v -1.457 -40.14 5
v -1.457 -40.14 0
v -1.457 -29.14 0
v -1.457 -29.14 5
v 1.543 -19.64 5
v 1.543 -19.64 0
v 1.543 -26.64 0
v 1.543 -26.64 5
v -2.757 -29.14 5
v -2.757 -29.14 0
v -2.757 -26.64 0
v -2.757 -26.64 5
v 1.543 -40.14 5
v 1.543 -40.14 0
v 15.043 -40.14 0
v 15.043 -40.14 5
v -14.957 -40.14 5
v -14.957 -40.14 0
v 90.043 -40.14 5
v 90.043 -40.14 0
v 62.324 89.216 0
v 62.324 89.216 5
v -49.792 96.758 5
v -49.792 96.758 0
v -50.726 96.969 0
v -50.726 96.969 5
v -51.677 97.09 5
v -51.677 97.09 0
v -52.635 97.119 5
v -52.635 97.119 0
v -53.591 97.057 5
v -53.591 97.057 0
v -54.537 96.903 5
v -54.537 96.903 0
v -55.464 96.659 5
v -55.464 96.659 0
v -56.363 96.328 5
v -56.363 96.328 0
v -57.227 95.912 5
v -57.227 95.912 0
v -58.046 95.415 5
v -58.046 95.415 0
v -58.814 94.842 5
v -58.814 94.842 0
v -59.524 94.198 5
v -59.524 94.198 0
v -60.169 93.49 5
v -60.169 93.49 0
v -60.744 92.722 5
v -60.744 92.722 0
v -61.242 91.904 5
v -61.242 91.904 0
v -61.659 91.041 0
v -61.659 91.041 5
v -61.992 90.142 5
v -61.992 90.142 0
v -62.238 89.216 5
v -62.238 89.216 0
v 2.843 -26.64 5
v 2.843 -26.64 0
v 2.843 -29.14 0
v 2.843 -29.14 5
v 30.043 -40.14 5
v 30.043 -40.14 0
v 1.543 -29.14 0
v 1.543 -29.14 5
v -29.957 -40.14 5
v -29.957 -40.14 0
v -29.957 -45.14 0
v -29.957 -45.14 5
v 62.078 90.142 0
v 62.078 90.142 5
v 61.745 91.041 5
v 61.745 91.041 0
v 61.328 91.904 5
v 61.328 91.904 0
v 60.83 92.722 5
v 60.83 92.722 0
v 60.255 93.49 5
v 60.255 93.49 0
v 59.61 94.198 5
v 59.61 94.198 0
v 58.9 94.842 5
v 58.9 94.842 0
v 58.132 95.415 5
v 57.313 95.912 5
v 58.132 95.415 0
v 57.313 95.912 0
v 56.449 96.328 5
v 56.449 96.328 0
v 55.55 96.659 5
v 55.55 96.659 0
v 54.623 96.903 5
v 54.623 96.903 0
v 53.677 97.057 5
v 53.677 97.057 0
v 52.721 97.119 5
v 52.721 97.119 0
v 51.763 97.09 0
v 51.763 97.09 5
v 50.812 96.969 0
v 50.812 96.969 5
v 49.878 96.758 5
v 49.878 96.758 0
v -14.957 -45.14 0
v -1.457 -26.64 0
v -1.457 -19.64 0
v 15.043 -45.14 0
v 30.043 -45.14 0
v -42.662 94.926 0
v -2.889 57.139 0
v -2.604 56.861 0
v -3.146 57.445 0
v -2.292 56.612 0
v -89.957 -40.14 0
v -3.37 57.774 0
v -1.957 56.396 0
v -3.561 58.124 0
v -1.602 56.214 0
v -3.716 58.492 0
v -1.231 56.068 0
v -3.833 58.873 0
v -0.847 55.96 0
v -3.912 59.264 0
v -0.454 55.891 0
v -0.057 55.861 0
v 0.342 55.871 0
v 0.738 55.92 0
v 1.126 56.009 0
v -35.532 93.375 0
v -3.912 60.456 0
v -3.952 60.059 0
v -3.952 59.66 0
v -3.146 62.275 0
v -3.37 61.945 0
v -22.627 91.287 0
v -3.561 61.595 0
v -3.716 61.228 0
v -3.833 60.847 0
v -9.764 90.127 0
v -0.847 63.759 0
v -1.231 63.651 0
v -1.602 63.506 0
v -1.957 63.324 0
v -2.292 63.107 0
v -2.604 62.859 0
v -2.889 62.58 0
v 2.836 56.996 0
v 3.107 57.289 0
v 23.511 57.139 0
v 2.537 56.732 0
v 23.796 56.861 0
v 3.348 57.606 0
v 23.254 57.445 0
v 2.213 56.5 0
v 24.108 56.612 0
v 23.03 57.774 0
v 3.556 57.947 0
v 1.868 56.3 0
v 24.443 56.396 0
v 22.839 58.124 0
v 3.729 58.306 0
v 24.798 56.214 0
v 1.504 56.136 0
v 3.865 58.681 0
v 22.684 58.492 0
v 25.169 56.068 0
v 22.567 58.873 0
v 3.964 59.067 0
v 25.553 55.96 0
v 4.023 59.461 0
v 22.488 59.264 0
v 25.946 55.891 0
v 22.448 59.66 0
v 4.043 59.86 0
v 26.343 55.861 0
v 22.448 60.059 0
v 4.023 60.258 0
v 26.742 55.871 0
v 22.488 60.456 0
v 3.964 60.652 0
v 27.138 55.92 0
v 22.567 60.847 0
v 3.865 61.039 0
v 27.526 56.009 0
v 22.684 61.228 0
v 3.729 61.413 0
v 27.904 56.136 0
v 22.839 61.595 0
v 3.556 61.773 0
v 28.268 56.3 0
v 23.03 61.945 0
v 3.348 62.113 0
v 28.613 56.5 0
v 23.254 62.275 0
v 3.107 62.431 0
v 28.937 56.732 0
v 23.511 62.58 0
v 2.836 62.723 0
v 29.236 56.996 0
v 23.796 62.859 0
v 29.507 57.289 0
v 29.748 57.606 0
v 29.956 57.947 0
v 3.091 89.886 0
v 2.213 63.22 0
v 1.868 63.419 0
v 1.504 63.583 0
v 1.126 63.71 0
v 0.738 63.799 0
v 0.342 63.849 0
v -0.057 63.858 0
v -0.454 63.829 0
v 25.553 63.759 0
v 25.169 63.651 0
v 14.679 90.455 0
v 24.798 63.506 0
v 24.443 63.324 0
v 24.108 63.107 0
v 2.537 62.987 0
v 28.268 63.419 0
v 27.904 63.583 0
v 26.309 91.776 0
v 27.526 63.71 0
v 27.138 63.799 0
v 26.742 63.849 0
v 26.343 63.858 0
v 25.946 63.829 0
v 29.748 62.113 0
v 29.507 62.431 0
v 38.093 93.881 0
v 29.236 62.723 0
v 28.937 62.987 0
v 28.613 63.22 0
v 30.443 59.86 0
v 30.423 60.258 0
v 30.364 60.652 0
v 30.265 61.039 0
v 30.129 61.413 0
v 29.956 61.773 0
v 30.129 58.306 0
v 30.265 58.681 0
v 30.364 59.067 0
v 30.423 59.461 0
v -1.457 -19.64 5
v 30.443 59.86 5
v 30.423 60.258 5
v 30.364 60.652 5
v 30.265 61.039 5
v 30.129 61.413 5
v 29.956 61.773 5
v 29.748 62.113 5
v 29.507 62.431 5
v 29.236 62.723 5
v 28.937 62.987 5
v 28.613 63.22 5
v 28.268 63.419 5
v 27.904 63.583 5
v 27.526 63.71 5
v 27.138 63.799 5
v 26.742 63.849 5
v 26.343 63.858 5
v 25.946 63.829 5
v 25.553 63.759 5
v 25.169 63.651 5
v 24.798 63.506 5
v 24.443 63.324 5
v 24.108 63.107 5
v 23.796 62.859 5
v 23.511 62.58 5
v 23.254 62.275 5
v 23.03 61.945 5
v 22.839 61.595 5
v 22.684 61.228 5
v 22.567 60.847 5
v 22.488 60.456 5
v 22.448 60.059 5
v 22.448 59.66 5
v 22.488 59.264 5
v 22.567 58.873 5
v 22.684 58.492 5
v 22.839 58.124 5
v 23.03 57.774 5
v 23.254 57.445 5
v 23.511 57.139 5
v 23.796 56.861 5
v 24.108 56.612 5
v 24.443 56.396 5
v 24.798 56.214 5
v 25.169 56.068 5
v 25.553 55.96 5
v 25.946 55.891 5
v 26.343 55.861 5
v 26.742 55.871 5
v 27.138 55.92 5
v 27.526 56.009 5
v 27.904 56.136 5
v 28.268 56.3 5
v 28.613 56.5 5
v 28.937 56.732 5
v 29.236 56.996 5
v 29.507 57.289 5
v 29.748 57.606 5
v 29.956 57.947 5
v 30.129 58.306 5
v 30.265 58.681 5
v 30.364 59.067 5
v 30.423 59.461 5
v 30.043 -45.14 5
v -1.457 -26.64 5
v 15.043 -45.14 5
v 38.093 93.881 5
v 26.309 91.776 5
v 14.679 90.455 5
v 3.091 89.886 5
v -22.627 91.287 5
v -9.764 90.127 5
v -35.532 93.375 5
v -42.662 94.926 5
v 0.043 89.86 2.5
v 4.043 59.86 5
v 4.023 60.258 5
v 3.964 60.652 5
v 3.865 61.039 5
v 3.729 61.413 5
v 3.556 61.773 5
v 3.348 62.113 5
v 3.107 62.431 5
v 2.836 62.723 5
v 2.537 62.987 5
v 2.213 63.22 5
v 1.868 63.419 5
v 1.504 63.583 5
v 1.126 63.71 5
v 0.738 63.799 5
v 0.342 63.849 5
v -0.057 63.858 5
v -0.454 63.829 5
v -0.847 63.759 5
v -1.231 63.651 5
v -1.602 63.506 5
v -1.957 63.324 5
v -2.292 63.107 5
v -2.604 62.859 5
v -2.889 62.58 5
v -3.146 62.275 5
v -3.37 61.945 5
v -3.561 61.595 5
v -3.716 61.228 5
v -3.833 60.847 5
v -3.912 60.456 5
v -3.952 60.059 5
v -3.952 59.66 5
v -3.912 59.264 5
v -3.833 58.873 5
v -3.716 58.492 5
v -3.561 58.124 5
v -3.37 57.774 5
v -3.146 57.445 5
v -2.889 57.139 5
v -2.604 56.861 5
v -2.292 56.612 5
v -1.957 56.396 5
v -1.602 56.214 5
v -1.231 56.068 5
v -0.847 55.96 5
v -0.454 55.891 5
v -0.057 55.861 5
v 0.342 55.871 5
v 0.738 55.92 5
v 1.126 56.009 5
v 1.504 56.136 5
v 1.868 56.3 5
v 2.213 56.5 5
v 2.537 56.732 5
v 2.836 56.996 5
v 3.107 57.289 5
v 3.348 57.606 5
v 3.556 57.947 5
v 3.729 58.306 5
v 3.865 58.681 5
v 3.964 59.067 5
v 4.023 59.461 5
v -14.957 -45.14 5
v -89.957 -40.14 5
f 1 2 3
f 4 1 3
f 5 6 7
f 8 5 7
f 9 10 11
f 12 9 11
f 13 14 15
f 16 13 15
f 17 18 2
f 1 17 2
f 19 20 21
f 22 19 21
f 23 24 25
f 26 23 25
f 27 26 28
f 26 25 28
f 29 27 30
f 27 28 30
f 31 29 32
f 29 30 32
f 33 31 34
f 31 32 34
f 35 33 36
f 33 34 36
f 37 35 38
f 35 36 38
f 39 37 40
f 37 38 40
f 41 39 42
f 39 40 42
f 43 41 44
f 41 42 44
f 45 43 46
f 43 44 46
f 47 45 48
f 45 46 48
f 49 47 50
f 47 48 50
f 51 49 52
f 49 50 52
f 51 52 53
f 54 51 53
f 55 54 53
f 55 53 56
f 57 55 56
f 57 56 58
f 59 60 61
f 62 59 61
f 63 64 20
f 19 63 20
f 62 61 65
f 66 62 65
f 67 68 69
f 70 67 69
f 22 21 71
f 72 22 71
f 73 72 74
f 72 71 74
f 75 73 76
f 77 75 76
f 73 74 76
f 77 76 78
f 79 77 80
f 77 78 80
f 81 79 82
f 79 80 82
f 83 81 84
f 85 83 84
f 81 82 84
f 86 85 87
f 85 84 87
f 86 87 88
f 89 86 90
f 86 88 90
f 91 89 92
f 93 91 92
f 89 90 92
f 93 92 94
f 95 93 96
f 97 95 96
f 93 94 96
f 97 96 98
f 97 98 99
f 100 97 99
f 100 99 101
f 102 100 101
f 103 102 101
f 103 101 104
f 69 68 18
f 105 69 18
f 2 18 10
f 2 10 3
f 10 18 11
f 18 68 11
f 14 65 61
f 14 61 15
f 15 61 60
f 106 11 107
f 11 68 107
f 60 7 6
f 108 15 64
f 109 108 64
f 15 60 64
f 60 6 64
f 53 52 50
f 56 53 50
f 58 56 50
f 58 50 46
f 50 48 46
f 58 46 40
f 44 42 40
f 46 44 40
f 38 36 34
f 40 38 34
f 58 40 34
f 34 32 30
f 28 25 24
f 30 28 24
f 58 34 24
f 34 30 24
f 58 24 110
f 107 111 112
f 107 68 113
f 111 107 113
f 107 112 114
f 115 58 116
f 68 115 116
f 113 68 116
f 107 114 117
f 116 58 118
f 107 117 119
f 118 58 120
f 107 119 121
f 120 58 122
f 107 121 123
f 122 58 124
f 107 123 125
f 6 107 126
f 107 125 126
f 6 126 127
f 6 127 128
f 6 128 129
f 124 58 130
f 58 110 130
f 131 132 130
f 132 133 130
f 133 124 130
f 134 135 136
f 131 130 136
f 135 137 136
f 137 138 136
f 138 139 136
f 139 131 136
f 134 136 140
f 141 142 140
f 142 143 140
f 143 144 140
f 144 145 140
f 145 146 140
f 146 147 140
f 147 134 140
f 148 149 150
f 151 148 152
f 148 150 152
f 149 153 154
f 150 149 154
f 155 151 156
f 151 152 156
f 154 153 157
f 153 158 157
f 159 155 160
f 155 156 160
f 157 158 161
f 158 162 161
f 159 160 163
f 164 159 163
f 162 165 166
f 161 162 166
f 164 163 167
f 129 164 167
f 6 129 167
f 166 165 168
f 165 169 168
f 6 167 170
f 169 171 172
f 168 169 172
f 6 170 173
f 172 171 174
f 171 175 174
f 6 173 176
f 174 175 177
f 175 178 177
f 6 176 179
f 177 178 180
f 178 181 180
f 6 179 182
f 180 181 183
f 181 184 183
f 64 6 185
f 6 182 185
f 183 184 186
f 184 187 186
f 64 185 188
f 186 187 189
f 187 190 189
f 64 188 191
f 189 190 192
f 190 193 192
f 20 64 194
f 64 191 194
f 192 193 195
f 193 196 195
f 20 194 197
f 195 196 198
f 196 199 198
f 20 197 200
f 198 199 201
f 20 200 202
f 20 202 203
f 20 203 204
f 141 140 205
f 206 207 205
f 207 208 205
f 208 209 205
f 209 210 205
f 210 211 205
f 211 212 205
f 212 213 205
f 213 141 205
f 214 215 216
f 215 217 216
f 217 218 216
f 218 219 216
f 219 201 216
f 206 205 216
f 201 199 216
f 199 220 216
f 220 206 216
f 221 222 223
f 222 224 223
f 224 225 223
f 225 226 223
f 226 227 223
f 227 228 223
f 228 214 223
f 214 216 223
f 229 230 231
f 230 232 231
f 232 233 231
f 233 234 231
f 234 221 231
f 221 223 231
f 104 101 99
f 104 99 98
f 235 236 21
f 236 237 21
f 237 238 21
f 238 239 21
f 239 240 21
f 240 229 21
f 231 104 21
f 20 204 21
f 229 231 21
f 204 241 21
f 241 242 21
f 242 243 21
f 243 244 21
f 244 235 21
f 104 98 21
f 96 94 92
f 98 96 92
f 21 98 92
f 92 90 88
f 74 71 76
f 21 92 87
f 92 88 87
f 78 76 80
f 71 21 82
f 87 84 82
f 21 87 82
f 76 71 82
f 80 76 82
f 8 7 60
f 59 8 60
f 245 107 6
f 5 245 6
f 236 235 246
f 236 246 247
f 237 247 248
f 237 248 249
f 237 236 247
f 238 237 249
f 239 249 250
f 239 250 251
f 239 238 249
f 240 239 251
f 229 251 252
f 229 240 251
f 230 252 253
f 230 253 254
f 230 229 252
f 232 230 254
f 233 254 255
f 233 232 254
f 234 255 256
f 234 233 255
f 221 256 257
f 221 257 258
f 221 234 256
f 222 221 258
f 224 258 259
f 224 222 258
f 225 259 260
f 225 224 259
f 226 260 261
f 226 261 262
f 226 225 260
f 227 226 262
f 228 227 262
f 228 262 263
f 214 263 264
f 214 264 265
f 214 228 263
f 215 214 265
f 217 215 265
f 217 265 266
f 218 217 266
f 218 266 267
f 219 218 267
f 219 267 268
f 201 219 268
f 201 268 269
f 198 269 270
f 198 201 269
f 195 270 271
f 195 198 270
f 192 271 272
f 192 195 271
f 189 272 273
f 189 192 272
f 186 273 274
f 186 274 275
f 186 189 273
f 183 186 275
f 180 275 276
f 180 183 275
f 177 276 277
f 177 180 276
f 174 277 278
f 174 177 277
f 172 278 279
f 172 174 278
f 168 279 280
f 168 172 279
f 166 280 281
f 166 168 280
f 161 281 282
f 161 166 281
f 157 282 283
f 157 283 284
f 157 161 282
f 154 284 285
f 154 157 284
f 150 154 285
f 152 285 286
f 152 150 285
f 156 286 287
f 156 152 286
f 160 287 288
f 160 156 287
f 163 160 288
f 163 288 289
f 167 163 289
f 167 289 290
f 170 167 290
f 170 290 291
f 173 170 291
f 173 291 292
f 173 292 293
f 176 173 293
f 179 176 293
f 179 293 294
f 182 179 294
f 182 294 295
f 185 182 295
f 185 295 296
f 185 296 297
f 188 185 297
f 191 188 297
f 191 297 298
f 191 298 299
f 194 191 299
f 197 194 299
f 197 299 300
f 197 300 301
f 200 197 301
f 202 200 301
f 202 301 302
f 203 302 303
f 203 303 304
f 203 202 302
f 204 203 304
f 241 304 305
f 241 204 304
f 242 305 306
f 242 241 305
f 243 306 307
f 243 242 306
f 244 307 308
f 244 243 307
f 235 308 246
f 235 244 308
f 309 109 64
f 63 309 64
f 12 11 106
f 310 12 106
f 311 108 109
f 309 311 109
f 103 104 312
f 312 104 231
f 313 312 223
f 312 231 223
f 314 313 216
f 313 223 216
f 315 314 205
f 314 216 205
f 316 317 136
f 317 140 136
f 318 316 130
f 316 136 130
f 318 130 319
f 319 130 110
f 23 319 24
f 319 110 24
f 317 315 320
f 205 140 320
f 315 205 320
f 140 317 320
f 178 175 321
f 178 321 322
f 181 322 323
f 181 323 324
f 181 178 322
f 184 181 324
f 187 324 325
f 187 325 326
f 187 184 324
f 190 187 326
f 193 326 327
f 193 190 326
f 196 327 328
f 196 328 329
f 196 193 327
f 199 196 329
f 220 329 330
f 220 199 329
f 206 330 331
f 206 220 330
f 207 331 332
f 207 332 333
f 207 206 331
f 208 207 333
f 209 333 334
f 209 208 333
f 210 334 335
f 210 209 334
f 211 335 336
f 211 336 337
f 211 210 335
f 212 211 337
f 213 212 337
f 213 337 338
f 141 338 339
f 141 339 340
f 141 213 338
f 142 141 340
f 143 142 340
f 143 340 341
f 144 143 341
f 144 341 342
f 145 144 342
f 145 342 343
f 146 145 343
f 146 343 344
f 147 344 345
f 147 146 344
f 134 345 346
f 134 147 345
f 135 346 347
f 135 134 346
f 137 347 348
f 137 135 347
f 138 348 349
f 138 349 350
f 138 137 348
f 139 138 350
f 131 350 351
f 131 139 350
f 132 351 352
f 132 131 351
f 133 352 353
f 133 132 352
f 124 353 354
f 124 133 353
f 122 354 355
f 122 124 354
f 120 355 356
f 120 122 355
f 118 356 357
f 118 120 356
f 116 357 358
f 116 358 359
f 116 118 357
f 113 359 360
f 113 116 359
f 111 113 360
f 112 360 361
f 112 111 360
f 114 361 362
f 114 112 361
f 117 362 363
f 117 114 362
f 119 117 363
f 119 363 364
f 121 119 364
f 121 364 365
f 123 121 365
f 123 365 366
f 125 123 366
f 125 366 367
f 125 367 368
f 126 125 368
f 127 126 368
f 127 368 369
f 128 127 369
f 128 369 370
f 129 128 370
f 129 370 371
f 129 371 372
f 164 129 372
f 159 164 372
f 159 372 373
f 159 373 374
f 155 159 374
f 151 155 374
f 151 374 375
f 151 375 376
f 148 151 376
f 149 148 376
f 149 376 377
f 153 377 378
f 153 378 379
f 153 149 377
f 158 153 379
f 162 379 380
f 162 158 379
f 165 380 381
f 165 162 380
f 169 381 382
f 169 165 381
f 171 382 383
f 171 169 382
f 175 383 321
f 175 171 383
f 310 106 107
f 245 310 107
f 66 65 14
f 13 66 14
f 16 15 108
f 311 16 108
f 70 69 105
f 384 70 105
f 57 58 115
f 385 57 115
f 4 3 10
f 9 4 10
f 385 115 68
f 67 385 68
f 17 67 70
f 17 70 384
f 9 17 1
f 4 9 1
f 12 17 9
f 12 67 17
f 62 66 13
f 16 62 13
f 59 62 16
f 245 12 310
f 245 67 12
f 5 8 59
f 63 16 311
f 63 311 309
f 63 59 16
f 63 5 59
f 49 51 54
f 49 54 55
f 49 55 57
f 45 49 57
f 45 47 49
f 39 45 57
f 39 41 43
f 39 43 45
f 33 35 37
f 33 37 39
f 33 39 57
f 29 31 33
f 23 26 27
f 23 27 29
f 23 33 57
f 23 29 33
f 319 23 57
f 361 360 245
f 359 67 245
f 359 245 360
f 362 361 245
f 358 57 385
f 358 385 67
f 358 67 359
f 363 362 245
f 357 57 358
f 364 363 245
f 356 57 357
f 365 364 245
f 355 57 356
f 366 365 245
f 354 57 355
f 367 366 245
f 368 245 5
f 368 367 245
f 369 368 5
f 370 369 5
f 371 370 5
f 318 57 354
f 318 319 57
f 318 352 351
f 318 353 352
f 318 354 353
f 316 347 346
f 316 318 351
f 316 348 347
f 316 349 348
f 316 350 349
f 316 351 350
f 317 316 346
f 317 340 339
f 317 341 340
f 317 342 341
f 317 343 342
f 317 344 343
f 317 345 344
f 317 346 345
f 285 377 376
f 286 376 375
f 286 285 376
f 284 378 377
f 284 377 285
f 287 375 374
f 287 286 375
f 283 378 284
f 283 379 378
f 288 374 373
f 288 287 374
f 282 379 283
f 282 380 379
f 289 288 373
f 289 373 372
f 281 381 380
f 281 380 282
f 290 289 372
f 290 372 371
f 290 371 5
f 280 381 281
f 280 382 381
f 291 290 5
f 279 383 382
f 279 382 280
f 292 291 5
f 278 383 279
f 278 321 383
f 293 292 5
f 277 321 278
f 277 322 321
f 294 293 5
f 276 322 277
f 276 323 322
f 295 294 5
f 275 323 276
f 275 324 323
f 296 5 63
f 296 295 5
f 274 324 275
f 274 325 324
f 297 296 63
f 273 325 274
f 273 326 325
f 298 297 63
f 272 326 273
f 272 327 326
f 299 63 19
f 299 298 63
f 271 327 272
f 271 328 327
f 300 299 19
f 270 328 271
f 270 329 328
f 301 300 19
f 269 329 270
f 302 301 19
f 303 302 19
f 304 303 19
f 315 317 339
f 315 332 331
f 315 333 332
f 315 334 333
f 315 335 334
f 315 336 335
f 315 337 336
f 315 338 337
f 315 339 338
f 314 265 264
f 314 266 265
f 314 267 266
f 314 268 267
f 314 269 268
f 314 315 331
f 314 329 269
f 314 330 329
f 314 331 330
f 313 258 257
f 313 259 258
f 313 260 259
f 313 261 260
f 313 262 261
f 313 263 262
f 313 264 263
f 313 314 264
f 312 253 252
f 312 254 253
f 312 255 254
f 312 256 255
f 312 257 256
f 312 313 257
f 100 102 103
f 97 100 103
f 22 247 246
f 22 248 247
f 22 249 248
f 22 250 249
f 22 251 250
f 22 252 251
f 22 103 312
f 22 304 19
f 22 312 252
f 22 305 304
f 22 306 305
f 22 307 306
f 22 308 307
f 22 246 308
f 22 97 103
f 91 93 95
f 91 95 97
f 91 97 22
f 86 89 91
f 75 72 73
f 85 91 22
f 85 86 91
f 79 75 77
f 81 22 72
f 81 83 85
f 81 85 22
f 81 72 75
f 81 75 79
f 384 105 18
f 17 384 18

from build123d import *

# Parameters (mm, degrees)
SKETCH1_R           = 4
BOSS_EXTRUDE1_DEPTH = 5


with BuildPart() as part:
    # Sketch1 → Boss-Extrude1 (new body)
    with BuildSketch(Plane.XY):
        with BuildLine():
            Line((-29.957010387, -40.140273422), (-29.957010387, -45.140273422))
            Line((-29.957010387, -45.140273422), (-14.957010387, -45.140273422))
            Line((-14.957010387, -45.140273422), (-14.957010387, -40.140273422))
            Line((-14.957010387, -40.140273422), (-1.457010387, -40.140273422))
            Line((-1.457010387, -40.140273422), (-1.457010387, -29.140273422))
            Line((-1.457010387, -29.140273422), (-2.757010387, -29.140273422))
            Line((-2.757010387, -29.140273422), (-2.757010387, -26.640273422))
            Line((-2.757010387, -26.640273422), (-1.457010387, -26.640273422))
            Line((-1.457010387, -26.640273422), (-1.457010387, -19.640273422))
            Line((-1.457010387, -19.640273422), (1.542989613, -19.640273422))
            Line((1.542989613, -19.640273422), (1.542989613, -26.640273422))
            Line((1.542989613, -26.640273422), (2.842989613, -26.640273422))
            Line((2.842989613, -26.640273422), (2.842989613, -29.140273422))
            Line((2.842989613, -29.140273422), (1.542989613, -29.140273422))
            Line((1.542989613, -29.140273422), (1.542989613, -40.140273422))
            Line((1.542989613, -40.140273422), (15.042989613, -40.140273422))
            Line((15.042989613, -40.140273422), (15.042989613, -45.140273422))
            Line((15.042989613, -45.140273422), (30.042989613, -45.140273422))
            Line((30.042989613, -45.140273422), (30.042989613, -40.140273422))
            Line((30.042989613, -40.140273422), (90.042989613, -40.140273422))
            Line((90.042989613, -40.140273422), (62.323763373, 89.216115695))
            ThreePointArc((62.323763373, 89.216115695), (57.728251424, 95.673109145), (49.877526115, 96.75828499))
            add(Edge.make_bspline(
                [(49.877526115, 96.75828499), (33.266013947, 92.159246048), (0.042989613, 87.560207107), (-33.180034722, 92.159246048), (-49.791546889, 96.75828499)],
                knots=[0.084712196, 0.084712196, 0.084712196, 0.084712196, 0.5, 0.915287804, 0.915287804, 0.915287804, 0.915287804], degree=3))
            ThreePointArc((-49.791546889, 96.75828499), (-57.642272198, 95.673109145), (-62.237784148, 89.216115695))
            Line((-62.237784148, 89.216115695), (-89.957010387, -40.140273422))
            Line((-89.957010387, -40.140273422), (-29.957010387, -40.140273422))
        make_face()
        with Locations((26.442989613, 59.859726578)):
            Circle(SKETCH1_R, mode=Mode.SUBTRACT)
        with Locations((0.042989613, 59.859726578)):
            Circle(SKETCH1_R, mode=Mode.SUBTRACT)
    extrude(amount=BOSS_EXTRUDE1_DEPTH)


solid = part.part
